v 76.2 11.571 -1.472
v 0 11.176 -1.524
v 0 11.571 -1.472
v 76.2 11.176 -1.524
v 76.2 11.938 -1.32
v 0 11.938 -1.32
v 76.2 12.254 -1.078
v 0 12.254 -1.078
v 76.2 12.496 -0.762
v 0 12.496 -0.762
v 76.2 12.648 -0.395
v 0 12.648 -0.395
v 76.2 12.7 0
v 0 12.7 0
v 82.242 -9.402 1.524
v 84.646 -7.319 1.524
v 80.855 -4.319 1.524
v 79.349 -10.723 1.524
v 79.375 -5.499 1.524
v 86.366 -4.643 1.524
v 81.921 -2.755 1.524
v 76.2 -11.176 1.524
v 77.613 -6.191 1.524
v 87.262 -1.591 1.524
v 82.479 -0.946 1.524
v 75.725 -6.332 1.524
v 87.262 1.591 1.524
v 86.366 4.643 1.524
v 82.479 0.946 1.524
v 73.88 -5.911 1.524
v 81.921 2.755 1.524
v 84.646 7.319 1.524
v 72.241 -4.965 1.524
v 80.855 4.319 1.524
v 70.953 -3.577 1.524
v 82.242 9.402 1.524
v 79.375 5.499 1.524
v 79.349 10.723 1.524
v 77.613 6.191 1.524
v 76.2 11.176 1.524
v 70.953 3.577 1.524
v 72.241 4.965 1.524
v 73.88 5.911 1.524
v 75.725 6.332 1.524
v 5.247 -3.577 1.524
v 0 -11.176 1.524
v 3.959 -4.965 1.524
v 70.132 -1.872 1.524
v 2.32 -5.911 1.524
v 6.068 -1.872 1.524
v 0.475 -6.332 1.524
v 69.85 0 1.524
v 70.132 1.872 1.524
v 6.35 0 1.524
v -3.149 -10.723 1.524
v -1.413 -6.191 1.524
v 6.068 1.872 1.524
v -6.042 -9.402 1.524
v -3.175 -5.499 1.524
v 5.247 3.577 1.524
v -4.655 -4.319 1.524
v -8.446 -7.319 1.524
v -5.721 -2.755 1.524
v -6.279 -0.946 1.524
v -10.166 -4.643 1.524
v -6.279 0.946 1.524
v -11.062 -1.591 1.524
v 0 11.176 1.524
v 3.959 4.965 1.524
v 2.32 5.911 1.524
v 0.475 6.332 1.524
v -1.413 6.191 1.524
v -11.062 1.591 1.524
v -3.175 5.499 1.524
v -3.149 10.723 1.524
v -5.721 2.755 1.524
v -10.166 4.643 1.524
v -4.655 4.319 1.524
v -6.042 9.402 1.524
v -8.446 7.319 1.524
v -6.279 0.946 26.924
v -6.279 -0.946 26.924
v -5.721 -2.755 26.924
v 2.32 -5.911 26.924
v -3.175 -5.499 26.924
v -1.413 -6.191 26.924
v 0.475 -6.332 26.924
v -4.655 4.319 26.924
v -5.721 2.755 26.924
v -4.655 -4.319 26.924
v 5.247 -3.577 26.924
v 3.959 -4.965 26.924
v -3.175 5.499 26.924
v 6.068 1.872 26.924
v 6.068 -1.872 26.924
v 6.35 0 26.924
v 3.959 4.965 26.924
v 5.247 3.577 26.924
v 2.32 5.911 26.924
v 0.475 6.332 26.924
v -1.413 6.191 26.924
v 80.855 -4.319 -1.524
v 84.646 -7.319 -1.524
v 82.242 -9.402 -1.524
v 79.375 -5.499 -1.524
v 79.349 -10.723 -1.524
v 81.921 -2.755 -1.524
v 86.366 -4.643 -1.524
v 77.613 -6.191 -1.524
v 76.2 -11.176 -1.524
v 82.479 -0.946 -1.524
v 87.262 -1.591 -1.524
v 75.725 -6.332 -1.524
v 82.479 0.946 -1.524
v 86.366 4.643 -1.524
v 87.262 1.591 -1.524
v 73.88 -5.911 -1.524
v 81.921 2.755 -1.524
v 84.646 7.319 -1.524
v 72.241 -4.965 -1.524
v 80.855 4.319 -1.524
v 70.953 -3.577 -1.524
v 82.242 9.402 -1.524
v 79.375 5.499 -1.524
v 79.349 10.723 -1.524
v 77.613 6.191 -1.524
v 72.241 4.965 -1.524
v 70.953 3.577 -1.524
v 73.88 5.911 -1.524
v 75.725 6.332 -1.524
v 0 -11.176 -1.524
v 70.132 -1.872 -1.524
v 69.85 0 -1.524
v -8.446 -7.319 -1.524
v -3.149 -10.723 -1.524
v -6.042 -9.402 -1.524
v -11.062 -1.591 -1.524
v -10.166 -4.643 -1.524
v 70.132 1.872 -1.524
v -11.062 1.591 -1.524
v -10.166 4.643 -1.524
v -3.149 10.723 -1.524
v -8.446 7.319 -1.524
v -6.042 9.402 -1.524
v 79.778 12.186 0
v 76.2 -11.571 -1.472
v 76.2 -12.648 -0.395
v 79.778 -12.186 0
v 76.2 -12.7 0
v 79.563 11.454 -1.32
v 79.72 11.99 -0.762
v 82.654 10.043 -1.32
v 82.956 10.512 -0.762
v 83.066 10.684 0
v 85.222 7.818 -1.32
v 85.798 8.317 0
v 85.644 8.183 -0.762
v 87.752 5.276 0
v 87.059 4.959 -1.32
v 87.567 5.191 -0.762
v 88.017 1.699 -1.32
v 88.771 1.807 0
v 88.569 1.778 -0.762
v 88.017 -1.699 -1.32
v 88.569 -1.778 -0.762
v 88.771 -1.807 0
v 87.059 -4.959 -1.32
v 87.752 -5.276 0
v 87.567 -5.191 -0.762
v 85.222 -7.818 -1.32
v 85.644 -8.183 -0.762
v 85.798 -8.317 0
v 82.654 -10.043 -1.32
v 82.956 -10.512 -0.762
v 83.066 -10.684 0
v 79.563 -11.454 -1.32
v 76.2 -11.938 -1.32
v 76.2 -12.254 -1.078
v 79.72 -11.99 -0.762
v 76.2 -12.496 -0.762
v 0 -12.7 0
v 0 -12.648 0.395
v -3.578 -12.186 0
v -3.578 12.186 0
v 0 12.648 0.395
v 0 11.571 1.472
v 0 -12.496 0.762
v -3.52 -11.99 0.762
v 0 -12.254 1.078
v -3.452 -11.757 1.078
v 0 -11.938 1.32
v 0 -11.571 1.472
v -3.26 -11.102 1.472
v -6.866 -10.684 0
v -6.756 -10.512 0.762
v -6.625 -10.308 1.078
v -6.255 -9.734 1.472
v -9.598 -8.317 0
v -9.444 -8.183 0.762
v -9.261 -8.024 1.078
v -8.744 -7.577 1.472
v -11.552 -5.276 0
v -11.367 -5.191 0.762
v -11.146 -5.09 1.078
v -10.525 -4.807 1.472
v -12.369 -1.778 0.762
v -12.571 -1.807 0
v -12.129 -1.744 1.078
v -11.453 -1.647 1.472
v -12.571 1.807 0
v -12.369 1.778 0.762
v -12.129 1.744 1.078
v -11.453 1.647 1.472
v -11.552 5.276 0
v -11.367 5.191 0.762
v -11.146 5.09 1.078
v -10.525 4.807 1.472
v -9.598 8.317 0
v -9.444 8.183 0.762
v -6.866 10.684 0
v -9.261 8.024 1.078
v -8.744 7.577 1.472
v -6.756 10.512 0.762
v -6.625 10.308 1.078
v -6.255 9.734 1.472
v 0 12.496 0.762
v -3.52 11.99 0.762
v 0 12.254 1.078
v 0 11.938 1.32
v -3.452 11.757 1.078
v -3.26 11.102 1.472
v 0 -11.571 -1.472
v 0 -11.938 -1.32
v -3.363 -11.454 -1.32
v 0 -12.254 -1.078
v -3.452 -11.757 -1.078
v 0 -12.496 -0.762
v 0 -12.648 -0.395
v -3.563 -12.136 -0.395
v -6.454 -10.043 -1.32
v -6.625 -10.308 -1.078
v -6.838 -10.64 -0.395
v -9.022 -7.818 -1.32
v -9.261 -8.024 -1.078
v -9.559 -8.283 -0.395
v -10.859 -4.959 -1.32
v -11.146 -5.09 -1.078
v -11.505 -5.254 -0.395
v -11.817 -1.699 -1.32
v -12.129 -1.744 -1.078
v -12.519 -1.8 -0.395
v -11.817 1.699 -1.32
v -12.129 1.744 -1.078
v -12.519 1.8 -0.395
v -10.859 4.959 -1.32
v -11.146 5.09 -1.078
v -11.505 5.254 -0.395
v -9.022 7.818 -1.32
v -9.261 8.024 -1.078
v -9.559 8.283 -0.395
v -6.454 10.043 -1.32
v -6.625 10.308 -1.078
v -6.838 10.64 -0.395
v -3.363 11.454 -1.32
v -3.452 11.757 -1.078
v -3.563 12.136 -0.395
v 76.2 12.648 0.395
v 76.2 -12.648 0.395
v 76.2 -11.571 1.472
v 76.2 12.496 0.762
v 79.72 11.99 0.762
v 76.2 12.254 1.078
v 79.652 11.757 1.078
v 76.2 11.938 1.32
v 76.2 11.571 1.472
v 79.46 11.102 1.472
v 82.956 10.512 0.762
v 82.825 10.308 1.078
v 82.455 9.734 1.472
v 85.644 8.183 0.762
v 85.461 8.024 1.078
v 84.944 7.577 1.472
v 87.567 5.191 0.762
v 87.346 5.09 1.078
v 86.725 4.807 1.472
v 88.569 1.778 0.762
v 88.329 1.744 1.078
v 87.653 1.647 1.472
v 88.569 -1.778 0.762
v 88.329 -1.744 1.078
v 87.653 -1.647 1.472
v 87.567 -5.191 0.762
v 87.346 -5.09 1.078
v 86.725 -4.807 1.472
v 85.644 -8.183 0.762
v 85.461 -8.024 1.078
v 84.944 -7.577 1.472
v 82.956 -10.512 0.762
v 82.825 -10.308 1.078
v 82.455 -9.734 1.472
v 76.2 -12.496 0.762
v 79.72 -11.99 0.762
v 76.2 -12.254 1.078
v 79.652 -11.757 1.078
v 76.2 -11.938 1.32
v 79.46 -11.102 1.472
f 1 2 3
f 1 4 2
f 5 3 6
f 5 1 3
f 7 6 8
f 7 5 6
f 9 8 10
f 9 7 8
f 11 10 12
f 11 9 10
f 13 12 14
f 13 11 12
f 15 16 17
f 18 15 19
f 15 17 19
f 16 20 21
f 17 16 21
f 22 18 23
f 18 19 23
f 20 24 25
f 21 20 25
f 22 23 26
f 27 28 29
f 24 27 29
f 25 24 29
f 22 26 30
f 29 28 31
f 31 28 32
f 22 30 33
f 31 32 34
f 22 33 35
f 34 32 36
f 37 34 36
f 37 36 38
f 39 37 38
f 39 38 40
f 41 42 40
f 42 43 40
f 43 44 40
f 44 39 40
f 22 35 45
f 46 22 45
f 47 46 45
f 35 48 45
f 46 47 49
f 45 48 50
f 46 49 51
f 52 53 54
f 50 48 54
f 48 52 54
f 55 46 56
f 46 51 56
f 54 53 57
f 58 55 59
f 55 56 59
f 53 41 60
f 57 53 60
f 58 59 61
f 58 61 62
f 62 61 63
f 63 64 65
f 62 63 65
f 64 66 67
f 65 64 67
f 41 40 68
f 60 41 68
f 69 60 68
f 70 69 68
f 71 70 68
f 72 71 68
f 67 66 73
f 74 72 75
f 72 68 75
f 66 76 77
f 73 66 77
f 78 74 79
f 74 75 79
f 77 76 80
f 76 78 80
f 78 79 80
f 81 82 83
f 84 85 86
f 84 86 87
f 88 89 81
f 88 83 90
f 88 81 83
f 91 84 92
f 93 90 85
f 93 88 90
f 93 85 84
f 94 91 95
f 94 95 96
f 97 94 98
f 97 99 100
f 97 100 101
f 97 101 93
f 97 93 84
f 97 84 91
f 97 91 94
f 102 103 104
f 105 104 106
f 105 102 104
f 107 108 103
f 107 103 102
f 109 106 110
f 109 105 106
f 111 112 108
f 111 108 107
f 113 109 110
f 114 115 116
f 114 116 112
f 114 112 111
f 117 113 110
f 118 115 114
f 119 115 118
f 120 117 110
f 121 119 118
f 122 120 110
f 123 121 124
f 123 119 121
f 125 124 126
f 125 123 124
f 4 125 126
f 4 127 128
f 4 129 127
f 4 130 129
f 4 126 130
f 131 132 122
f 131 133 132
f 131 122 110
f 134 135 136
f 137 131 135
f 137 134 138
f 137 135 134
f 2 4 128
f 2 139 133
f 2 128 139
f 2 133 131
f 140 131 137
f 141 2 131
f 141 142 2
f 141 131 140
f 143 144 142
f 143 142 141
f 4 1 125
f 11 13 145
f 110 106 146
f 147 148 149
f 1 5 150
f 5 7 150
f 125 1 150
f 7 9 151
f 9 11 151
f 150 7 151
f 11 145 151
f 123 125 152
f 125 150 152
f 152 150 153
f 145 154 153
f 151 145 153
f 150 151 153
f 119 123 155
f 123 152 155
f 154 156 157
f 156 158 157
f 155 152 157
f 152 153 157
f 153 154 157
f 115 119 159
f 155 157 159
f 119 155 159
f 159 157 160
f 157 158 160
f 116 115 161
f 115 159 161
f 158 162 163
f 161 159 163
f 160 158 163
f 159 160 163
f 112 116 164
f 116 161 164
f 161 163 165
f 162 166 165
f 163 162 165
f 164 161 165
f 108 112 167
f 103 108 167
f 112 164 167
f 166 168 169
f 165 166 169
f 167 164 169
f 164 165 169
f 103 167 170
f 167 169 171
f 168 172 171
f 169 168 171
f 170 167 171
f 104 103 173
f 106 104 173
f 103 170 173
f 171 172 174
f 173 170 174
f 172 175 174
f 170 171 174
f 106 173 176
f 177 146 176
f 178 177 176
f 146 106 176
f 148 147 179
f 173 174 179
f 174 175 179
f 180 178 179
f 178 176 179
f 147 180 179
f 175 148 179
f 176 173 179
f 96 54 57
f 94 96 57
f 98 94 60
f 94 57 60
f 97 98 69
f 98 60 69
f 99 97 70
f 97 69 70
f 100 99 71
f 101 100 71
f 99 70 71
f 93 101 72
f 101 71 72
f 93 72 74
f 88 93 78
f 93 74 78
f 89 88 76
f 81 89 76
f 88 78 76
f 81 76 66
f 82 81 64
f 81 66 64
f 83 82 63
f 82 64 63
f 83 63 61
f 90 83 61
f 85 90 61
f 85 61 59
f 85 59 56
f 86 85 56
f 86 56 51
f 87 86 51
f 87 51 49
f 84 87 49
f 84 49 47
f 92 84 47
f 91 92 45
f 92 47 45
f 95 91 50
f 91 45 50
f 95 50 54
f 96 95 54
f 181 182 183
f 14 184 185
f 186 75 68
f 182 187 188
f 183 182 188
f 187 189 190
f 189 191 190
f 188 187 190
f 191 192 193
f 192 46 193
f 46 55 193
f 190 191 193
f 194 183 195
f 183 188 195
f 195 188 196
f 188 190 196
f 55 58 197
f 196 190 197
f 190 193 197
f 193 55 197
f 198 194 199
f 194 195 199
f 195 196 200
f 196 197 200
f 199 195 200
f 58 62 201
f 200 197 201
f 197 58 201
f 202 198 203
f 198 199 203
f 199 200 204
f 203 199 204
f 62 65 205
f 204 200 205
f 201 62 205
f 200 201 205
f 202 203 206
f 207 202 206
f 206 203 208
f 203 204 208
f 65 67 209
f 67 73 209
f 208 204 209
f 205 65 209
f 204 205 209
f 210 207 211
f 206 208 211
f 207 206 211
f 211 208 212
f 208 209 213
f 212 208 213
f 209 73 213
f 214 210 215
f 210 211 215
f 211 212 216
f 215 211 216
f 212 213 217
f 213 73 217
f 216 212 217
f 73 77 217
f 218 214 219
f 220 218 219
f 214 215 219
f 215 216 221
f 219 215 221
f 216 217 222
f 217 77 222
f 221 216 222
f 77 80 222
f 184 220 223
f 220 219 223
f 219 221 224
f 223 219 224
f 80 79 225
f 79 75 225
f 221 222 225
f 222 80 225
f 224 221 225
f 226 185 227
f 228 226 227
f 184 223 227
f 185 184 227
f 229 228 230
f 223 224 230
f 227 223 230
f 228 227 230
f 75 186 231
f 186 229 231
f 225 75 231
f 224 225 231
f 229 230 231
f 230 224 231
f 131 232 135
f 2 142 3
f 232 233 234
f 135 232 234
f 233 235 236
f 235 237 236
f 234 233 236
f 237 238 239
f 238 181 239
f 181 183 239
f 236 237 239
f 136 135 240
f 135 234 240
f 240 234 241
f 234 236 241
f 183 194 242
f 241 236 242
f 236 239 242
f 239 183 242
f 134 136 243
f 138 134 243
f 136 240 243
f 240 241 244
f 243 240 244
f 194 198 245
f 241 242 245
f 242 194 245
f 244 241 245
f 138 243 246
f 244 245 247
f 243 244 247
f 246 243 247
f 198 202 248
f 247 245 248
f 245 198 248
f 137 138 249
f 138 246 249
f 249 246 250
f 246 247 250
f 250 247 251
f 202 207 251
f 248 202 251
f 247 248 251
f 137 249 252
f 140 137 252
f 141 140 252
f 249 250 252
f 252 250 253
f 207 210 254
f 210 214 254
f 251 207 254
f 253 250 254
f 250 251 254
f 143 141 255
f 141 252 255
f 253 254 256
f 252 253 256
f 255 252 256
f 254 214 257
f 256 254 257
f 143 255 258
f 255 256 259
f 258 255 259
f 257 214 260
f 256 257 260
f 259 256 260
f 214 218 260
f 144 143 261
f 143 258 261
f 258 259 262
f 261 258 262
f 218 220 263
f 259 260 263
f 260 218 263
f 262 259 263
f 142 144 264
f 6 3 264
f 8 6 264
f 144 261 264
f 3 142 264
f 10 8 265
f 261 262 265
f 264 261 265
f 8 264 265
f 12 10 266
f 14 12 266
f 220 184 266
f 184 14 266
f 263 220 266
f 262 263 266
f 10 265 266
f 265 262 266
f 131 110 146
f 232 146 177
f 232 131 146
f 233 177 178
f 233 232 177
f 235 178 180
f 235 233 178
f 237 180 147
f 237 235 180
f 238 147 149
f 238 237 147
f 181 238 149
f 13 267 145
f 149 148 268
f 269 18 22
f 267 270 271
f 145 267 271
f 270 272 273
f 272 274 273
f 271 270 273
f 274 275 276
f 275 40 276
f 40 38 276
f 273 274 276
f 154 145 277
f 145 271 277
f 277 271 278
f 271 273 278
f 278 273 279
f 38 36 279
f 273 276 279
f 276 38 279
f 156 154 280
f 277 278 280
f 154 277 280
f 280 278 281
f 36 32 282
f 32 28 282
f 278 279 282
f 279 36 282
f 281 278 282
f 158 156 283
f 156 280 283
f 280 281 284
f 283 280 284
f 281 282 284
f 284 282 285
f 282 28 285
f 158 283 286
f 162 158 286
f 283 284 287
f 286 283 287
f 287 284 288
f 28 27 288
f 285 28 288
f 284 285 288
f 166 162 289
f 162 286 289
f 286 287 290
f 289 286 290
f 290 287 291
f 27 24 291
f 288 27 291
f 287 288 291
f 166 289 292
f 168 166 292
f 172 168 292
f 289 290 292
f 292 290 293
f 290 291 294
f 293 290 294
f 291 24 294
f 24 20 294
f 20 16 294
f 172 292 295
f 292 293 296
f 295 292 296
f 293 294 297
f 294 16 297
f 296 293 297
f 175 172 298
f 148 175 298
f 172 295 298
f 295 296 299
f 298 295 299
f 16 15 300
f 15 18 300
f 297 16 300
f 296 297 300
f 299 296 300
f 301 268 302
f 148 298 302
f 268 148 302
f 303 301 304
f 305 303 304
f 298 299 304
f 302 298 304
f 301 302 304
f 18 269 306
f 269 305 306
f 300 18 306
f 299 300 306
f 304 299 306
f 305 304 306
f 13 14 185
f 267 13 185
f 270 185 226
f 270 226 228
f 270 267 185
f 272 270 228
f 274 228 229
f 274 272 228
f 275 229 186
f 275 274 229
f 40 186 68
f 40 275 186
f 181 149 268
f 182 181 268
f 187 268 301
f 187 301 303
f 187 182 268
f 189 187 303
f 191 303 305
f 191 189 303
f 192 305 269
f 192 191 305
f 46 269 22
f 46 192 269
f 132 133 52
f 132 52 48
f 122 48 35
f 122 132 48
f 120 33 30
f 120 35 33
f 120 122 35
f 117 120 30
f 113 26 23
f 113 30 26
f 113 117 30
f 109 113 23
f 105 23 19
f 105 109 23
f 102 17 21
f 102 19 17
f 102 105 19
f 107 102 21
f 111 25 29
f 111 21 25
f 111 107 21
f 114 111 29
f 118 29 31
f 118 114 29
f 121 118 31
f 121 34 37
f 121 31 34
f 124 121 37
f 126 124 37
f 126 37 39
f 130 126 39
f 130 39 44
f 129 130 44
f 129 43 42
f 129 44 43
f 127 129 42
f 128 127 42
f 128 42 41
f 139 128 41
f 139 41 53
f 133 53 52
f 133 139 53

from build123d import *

# Parameters (mm, degrees)
BOSS_EXTRUDE1_DEPTH     = 1.524
CUT_EXTRUDE1_DEPTH      = 3.048
CUT_EXTRUDE1_DEPTH_BACK = 90.815491849
SKETCH2_R               = 6.35
SKETCH4_R               = 6.35
BOSS_EXTRUDE3_DEPTH     = 25.4
FILLET1_R               = 1.524


with BuildPart() as part:
    # Sketch1 → Boss-Extrude1 (new, symmetric)
    with BuildSketch(Plane.XY):
        with BuildLine():
            Line((0, 12.7), (76.2, 12.7))
            ThreePointArc((76.2, 12.7), (88.9, 0), (76.2, -12.7))
            Line((76.2, -12.7), (0, -12.7))
            ThreePointArc((0, -12.7), (-12.7, 0), (0, 12.7))
        make_face()
    extrude(amount=BOSS_EXTRUDE1_DEPTH, both=True)

    # Sketch2 → Cut-Extrude1 (cut, two sides: drawn at the far end of the back side and taken through both)
    with BuildSketch(Plane.XY.offset(-CUT_EXTRUDE1_DEPTH_BACK)):
        with Locations(Location((76.2, 0, 0), (0, 0, 180))):
            Circle(SKETCH2_R)
    extrude(amount=CUT_EXTRUDE1_DEPTH + CUT_EXTRUDE1_DEPTH_BACK, mode=Mode.SUBTRACT)

    # Sketch4 → Boss-Extrude3 (add)
    with BuildSketch(Plane.XY.offset(1.524)):
        Circle(SKETCH4_R)
    extrude(amount=BOSS_EXTRUDE3_DEPTH)

    # Fillet1
    fillet1_edges = [part.edges().sort_by_distance(p)[0] for p in [
        (88.9, 0, 1.524),
        (38.1, -12.7, 1.524),
        (-12.7, 0, 1.524),
        (88.9, 0, -1.524),
        (38.1, -12.7, -1.524),
        (-12.7, 0, -1.524),
        (38.1, 12.7, 1.524),
        (38.1, 12.7, -1.524),
    ]]
    fillet(fillet1_edges, radius=FILLET1_R - 0.0001)  # a hair under: the kernel refuses the full size


solid = part.part
